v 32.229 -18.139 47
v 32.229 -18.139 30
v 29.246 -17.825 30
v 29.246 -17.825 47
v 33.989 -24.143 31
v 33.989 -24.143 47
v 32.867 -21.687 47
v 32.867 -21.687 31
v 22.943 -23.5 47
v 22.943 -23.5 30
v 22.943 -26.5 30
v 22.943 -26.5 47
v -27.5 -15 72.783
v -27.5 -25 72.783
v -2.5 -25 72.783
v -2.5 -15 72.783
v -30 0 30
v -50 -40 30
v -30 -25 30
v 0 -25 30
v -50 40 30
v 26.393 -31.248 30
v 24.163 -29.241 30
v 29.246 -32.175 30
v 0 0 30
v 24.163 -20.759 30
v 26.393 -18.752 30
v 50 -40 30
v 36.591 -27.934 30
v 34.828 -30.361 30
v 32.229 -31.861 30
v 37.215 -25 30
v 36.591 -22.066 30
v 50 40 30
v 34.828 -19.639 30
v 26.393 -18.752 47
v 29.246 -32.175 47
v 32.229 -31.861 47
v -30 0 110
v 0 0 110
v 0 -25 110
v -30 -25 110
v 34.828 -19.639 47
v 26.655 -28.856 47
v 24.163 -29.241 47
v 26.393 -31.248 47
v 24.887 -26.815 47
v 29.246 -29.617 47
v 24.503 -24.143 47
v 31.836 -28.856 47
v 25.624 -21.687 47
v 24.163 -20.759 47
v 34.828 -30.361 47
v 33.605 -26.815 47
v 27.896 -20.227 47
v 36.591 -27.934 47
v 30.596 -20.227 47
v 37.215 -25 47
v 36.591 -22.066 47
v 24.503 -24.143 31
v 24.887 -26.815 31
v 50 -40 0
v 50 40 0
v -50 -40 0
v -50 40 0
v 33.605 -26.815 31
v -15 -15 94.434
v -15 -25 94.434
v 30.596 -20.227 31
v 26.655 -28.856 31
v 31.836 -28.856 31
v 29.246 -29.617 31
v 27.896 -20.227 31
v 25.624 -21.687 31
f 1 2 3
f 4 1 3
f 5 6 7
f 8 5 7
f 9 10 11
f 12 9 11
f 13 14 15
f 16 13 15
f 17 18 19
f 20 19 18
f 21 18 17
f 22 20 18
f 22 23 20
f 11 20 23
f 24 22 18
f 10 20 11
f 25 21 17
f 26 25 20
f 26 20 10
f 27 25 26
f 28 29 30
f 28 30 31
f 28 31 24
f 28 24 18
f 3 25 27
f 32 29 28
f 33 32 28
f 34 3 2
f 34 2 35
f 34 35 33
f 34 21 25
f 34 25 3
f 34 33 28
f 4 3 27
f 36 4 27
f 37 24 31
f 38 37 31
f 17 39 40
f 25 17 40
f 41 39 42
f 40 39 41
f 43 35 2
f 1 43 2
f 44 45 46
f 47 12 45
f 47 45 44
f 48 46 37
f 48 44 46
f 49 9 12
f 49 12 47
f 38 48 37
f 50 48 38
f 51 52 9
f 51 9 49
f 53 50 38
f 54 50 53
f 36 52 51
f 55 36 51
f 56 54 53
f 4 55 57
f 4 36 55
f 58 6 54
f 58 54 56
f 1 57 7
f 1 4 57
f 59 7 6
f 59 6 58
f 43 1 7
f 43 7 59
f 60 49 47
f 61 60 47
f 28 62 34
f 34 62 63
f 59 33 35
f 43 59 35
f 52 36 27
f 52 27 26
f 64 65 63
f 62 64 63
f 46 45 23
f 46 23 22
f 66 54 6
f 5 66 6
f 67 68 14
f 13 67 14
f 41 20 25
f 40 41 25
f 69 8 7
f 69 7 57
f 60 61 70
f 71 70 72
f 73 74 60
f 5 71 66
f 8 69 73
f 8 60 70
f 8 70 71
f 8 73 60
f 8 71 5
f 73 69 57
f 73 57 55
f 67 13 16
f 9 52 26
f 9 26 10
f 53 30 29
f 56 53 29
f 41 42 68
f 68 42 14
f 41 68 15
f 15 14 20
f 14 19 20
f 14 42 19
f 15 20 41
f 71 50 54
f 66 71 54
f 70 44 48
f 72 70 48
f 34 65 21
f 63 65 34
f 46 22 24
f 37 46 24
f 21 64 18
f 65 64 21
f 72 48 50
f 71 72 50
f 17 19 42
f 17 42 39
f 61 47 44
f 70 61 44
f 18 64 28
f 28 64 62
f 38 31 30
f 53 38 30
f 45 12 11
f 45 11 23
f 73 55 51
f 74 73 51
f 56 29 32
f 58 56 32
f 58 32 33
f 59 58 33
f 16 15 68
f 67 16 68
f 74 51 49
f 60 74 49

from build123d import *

# Parameters (mm, degrees)
F0_W     = 100
F0_H     = 80
F1_DEPTH = 30
F2_W     = 30
F2_H     = 25
F3_DEPTH = 80
F5_DEPTH = 10
F7_DEPTH = 17
F9_DEPTH = 16


with BuildPart() as f1:
    # F0 (on Top) → F1 (new body)
    with BuildSketch(Plane.XY):
        Rectangle(F0_W, F0_H)
    extrude(amount=F1_DEPTH)

    # F2 (on face) → F3 (join)
    with BuildSketch(Plane.XY.offset(30)):
        with Locations((-15, -12.5)):
            Rectangle(F2_W, F2_H)
    extrude(amount=F3_DEPTH)

    # F4 (on face) → F5 (cut)
    with BuildSketch(Plane.XZ.offset(25)):
        Polygon((-27.5, 72.783122), (-2.5, 72.783122), (-15, 94.433757), align=None)
    extrude(amount=-F5_DEPTH, mode=Mode.SUBTRACT)

    # F6 (on face) → F7 (join)
    with BuildSketch(Plane.XY.offset(30)):
        Polygon((22.943055, -23.5), (22.943055, -26.5), (24.163265, -29.240636), (26.392699, -31.248028), (29.245869, -32.175079), (32.229434, -31.861494), (34.827511, -30.361494), (36.590866, -27.934443), (37.214602, -25), (36.590866, -22.065557), (34.827511, -19.638506), (32.229434, -18.138506), (29.245869, -17.824921), (26.392699, -18.751972), (24.163265, -20.759364), align=None)
    extrude(amount=F7_DEPTH)

    # F8 (on face) → F9 (cut)
    with BuildSketch(Plane.XY.offset(47)):
        Polygon((25.624484, -21.686973), (24.502864, -24.14298), (24.887114, -26.815498), (26.655238, -28.856021), (29.245869, -29.616699), (31.8365, -28.856021), (33.604624, -26.815498), (33.988874, -24.14298), (32.867253, -21.686973), (30.595869, -20.227243), (27.895869, -20.227243), align=None)
    extrude(amount=-F9_DEPTH, mode=Mode.SUBTRACT)


solid = f1.part
